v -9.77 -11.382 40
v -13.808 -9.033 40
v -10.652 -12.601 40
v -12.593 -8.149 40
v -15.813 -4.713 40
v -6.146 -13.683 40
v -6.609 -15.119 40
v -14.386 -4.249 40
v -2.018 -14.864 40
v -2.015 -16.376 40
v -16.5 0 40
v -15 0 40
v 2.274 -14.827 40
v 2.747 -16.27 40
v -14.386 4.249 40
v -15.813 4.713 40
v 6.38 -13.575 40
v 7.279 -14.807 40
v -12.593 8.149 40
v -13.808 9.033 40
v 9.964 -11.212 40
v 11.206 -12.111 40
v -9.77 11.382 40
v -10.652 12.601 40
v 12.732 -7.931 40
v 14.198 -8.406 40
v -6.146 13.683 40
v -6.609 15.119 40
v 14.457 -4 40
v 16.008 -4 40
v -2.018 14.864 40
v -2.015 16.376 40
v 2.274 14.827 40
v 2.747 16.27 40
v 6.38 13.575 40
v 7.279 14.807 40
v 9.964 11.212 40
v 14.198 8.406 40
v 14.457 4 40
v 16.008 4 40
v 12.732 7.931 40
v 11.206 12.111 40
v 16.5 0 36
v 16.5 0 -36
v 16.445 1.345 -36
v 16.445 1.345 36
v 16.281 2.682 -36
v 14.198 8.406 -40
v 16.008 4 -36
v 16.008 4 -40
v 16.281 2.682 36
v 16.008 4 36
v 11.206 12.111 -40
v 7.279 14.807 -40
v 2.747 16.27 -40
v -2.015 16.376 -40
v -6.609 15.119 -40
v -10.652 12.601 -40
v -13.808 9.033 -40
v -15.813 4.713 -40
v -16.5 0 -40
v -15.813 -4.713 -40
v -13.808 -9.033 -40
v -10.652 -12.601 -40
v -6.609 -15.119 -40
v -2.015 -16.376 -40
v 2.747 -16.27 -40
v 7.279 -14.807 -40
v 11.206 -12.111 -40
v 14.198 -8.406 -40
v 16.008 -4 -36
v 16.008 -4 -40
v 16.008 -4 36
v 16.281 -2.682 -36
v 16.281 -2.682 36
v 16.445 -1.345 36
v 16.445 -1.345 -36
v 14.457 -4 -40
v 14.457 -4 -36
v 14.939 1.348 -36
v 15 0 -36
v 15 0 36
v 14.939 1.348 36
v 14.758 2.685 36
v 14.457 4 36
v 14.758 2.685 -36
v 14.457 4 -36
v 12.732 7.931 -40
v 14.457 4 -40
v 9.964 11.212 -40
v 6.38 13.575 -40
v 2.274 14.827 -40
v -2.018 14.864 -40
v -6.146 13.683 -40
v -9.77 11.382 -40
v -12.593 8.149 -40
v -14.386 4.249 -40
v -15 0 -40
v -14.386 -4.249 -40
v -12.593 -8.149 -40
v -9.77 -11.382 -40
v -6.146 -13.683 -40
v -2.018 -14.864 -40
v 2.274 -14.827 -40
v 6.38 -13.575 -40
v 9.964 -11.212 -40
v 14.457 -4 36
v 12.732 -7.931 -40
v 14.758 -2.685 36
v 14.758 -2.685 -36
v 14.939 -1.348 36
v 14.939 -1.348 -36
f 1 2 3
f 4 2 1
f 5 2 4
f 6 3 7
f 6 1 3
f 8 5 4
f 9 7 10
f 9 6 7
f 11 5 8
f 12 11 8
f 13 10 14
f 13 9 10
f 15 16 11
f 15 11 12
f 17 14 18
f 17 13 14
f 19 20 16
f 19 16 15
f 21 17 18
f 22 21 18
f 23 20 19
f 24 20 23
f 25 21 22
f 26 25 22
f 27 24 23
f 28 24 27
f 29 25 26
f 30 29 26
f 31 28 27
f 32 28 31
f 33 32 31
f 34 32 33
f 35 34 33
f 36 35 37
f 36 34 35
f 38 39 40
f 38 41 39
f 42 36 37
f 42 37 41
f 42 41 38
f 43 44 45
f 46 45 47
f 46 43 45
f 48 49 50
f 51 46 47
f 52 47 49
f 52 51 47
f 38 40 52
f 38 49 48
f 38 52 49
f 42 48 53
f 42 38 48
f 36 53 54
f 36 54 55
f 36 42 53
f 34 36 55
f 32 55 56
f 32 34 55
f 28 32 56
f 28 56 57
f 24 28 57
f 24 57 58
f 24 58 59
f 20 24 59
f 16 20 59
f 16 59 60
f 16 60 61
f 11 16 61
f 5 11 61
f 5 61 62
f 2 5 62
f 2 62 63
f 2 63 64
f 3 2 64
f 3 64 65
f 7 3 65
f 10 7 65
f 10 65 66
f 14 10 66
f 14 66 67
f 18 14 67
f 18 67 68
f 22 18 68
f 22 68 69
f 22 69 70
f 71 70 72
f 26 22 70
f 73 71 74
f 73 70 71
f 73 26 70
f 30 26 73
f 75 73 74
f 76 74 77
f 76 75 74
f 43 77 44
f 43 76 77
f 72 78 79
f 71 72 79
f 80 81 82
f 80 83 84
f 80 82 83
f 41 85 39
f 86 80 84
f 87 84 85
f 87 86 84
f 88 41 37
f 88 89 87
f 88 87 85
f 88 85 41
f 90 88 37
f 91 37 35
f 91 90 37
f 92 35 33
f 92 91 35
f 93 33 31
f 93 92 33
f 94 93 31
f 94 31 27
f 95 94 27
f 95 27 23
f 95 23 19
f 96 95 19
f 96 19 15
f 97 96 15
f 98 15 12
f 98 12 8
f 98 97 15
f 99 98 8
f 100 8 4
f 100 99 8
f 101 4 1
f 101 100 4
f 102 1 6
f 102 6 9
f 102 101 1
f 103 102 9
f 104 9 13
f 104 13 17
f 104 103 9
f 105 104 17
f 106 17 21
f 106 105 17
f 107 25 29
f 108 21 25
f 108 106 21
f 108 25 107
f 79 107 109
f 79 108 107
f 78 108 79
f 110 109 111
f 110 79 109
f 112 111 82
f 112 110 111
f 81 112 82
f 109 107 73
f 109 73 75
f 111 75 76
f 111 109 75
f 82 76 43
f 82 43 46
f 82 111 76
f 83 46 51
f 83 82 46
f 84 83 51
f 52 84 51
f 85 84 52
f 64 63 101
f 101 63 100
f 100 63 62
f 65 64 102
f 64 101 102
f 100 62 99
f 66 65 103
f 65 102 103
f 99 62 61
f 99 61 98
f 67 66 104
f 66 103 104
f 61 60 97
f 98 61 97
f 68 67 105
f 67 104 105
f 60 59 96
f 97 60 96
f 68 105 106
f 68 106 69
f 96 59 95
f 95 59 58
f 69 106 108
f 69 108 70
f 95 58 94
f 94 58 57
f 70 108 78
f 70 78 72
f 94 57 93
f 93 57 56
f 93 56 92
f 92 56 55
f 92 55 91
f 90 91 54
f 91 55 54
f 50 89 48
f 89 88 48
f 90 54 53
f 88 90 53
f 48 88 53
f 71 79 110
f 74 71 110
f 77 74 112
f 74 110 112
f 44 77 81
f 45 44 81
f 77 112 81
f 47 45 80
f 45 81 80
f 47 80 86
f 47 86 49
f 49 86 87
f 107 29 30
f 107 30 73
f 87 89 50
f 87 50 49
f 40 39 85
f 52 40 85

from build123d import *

# Parameters (mm, degrees)
SKETCH1_R           = 16.5
SKETCH1_R_2         = 15
BOSS_EXTRUDE1_DEPTH = 40
SKETCH3_W           = 4
SKETCH3_H           = 8
CUT_EXTRUDE1_DEPTH  = 47.308746474


with BuildPart() as part:
    # Sketch1 → Boss-Extrude1 (new, symmetric)
    with BuildSketch(Plane.XY):
        Circle(SKETCH1_R)
        Circle(SKETCH1_R_2, mode=Mode.SUBTRACT)
    extrude(amount=BOSS_EXTRUDE1_DEPTH, both=True)

    # Sketch3 → Cut-Extrude1 (cut, through all)
    with BuildSketch(Plane(origin=(0, 0, 0), x_dir=(0, 0, -1), z_dir=(1, 0, 0))):
        with Locations((-38, 0)):
            Rectangle(SKETCH3_W, SKETCH3_H)
    cut_extrude1 = extrude(amount=CUT_EXTRUDE1_DEPTH, mode=Mode.SUBTRACT)

    # Mirror1: Cut-Extrude1 across plane
    add(cut_extrude1.mirror(Plane.XY), mode=Mode.SUBTRACT)


solid = part.part
